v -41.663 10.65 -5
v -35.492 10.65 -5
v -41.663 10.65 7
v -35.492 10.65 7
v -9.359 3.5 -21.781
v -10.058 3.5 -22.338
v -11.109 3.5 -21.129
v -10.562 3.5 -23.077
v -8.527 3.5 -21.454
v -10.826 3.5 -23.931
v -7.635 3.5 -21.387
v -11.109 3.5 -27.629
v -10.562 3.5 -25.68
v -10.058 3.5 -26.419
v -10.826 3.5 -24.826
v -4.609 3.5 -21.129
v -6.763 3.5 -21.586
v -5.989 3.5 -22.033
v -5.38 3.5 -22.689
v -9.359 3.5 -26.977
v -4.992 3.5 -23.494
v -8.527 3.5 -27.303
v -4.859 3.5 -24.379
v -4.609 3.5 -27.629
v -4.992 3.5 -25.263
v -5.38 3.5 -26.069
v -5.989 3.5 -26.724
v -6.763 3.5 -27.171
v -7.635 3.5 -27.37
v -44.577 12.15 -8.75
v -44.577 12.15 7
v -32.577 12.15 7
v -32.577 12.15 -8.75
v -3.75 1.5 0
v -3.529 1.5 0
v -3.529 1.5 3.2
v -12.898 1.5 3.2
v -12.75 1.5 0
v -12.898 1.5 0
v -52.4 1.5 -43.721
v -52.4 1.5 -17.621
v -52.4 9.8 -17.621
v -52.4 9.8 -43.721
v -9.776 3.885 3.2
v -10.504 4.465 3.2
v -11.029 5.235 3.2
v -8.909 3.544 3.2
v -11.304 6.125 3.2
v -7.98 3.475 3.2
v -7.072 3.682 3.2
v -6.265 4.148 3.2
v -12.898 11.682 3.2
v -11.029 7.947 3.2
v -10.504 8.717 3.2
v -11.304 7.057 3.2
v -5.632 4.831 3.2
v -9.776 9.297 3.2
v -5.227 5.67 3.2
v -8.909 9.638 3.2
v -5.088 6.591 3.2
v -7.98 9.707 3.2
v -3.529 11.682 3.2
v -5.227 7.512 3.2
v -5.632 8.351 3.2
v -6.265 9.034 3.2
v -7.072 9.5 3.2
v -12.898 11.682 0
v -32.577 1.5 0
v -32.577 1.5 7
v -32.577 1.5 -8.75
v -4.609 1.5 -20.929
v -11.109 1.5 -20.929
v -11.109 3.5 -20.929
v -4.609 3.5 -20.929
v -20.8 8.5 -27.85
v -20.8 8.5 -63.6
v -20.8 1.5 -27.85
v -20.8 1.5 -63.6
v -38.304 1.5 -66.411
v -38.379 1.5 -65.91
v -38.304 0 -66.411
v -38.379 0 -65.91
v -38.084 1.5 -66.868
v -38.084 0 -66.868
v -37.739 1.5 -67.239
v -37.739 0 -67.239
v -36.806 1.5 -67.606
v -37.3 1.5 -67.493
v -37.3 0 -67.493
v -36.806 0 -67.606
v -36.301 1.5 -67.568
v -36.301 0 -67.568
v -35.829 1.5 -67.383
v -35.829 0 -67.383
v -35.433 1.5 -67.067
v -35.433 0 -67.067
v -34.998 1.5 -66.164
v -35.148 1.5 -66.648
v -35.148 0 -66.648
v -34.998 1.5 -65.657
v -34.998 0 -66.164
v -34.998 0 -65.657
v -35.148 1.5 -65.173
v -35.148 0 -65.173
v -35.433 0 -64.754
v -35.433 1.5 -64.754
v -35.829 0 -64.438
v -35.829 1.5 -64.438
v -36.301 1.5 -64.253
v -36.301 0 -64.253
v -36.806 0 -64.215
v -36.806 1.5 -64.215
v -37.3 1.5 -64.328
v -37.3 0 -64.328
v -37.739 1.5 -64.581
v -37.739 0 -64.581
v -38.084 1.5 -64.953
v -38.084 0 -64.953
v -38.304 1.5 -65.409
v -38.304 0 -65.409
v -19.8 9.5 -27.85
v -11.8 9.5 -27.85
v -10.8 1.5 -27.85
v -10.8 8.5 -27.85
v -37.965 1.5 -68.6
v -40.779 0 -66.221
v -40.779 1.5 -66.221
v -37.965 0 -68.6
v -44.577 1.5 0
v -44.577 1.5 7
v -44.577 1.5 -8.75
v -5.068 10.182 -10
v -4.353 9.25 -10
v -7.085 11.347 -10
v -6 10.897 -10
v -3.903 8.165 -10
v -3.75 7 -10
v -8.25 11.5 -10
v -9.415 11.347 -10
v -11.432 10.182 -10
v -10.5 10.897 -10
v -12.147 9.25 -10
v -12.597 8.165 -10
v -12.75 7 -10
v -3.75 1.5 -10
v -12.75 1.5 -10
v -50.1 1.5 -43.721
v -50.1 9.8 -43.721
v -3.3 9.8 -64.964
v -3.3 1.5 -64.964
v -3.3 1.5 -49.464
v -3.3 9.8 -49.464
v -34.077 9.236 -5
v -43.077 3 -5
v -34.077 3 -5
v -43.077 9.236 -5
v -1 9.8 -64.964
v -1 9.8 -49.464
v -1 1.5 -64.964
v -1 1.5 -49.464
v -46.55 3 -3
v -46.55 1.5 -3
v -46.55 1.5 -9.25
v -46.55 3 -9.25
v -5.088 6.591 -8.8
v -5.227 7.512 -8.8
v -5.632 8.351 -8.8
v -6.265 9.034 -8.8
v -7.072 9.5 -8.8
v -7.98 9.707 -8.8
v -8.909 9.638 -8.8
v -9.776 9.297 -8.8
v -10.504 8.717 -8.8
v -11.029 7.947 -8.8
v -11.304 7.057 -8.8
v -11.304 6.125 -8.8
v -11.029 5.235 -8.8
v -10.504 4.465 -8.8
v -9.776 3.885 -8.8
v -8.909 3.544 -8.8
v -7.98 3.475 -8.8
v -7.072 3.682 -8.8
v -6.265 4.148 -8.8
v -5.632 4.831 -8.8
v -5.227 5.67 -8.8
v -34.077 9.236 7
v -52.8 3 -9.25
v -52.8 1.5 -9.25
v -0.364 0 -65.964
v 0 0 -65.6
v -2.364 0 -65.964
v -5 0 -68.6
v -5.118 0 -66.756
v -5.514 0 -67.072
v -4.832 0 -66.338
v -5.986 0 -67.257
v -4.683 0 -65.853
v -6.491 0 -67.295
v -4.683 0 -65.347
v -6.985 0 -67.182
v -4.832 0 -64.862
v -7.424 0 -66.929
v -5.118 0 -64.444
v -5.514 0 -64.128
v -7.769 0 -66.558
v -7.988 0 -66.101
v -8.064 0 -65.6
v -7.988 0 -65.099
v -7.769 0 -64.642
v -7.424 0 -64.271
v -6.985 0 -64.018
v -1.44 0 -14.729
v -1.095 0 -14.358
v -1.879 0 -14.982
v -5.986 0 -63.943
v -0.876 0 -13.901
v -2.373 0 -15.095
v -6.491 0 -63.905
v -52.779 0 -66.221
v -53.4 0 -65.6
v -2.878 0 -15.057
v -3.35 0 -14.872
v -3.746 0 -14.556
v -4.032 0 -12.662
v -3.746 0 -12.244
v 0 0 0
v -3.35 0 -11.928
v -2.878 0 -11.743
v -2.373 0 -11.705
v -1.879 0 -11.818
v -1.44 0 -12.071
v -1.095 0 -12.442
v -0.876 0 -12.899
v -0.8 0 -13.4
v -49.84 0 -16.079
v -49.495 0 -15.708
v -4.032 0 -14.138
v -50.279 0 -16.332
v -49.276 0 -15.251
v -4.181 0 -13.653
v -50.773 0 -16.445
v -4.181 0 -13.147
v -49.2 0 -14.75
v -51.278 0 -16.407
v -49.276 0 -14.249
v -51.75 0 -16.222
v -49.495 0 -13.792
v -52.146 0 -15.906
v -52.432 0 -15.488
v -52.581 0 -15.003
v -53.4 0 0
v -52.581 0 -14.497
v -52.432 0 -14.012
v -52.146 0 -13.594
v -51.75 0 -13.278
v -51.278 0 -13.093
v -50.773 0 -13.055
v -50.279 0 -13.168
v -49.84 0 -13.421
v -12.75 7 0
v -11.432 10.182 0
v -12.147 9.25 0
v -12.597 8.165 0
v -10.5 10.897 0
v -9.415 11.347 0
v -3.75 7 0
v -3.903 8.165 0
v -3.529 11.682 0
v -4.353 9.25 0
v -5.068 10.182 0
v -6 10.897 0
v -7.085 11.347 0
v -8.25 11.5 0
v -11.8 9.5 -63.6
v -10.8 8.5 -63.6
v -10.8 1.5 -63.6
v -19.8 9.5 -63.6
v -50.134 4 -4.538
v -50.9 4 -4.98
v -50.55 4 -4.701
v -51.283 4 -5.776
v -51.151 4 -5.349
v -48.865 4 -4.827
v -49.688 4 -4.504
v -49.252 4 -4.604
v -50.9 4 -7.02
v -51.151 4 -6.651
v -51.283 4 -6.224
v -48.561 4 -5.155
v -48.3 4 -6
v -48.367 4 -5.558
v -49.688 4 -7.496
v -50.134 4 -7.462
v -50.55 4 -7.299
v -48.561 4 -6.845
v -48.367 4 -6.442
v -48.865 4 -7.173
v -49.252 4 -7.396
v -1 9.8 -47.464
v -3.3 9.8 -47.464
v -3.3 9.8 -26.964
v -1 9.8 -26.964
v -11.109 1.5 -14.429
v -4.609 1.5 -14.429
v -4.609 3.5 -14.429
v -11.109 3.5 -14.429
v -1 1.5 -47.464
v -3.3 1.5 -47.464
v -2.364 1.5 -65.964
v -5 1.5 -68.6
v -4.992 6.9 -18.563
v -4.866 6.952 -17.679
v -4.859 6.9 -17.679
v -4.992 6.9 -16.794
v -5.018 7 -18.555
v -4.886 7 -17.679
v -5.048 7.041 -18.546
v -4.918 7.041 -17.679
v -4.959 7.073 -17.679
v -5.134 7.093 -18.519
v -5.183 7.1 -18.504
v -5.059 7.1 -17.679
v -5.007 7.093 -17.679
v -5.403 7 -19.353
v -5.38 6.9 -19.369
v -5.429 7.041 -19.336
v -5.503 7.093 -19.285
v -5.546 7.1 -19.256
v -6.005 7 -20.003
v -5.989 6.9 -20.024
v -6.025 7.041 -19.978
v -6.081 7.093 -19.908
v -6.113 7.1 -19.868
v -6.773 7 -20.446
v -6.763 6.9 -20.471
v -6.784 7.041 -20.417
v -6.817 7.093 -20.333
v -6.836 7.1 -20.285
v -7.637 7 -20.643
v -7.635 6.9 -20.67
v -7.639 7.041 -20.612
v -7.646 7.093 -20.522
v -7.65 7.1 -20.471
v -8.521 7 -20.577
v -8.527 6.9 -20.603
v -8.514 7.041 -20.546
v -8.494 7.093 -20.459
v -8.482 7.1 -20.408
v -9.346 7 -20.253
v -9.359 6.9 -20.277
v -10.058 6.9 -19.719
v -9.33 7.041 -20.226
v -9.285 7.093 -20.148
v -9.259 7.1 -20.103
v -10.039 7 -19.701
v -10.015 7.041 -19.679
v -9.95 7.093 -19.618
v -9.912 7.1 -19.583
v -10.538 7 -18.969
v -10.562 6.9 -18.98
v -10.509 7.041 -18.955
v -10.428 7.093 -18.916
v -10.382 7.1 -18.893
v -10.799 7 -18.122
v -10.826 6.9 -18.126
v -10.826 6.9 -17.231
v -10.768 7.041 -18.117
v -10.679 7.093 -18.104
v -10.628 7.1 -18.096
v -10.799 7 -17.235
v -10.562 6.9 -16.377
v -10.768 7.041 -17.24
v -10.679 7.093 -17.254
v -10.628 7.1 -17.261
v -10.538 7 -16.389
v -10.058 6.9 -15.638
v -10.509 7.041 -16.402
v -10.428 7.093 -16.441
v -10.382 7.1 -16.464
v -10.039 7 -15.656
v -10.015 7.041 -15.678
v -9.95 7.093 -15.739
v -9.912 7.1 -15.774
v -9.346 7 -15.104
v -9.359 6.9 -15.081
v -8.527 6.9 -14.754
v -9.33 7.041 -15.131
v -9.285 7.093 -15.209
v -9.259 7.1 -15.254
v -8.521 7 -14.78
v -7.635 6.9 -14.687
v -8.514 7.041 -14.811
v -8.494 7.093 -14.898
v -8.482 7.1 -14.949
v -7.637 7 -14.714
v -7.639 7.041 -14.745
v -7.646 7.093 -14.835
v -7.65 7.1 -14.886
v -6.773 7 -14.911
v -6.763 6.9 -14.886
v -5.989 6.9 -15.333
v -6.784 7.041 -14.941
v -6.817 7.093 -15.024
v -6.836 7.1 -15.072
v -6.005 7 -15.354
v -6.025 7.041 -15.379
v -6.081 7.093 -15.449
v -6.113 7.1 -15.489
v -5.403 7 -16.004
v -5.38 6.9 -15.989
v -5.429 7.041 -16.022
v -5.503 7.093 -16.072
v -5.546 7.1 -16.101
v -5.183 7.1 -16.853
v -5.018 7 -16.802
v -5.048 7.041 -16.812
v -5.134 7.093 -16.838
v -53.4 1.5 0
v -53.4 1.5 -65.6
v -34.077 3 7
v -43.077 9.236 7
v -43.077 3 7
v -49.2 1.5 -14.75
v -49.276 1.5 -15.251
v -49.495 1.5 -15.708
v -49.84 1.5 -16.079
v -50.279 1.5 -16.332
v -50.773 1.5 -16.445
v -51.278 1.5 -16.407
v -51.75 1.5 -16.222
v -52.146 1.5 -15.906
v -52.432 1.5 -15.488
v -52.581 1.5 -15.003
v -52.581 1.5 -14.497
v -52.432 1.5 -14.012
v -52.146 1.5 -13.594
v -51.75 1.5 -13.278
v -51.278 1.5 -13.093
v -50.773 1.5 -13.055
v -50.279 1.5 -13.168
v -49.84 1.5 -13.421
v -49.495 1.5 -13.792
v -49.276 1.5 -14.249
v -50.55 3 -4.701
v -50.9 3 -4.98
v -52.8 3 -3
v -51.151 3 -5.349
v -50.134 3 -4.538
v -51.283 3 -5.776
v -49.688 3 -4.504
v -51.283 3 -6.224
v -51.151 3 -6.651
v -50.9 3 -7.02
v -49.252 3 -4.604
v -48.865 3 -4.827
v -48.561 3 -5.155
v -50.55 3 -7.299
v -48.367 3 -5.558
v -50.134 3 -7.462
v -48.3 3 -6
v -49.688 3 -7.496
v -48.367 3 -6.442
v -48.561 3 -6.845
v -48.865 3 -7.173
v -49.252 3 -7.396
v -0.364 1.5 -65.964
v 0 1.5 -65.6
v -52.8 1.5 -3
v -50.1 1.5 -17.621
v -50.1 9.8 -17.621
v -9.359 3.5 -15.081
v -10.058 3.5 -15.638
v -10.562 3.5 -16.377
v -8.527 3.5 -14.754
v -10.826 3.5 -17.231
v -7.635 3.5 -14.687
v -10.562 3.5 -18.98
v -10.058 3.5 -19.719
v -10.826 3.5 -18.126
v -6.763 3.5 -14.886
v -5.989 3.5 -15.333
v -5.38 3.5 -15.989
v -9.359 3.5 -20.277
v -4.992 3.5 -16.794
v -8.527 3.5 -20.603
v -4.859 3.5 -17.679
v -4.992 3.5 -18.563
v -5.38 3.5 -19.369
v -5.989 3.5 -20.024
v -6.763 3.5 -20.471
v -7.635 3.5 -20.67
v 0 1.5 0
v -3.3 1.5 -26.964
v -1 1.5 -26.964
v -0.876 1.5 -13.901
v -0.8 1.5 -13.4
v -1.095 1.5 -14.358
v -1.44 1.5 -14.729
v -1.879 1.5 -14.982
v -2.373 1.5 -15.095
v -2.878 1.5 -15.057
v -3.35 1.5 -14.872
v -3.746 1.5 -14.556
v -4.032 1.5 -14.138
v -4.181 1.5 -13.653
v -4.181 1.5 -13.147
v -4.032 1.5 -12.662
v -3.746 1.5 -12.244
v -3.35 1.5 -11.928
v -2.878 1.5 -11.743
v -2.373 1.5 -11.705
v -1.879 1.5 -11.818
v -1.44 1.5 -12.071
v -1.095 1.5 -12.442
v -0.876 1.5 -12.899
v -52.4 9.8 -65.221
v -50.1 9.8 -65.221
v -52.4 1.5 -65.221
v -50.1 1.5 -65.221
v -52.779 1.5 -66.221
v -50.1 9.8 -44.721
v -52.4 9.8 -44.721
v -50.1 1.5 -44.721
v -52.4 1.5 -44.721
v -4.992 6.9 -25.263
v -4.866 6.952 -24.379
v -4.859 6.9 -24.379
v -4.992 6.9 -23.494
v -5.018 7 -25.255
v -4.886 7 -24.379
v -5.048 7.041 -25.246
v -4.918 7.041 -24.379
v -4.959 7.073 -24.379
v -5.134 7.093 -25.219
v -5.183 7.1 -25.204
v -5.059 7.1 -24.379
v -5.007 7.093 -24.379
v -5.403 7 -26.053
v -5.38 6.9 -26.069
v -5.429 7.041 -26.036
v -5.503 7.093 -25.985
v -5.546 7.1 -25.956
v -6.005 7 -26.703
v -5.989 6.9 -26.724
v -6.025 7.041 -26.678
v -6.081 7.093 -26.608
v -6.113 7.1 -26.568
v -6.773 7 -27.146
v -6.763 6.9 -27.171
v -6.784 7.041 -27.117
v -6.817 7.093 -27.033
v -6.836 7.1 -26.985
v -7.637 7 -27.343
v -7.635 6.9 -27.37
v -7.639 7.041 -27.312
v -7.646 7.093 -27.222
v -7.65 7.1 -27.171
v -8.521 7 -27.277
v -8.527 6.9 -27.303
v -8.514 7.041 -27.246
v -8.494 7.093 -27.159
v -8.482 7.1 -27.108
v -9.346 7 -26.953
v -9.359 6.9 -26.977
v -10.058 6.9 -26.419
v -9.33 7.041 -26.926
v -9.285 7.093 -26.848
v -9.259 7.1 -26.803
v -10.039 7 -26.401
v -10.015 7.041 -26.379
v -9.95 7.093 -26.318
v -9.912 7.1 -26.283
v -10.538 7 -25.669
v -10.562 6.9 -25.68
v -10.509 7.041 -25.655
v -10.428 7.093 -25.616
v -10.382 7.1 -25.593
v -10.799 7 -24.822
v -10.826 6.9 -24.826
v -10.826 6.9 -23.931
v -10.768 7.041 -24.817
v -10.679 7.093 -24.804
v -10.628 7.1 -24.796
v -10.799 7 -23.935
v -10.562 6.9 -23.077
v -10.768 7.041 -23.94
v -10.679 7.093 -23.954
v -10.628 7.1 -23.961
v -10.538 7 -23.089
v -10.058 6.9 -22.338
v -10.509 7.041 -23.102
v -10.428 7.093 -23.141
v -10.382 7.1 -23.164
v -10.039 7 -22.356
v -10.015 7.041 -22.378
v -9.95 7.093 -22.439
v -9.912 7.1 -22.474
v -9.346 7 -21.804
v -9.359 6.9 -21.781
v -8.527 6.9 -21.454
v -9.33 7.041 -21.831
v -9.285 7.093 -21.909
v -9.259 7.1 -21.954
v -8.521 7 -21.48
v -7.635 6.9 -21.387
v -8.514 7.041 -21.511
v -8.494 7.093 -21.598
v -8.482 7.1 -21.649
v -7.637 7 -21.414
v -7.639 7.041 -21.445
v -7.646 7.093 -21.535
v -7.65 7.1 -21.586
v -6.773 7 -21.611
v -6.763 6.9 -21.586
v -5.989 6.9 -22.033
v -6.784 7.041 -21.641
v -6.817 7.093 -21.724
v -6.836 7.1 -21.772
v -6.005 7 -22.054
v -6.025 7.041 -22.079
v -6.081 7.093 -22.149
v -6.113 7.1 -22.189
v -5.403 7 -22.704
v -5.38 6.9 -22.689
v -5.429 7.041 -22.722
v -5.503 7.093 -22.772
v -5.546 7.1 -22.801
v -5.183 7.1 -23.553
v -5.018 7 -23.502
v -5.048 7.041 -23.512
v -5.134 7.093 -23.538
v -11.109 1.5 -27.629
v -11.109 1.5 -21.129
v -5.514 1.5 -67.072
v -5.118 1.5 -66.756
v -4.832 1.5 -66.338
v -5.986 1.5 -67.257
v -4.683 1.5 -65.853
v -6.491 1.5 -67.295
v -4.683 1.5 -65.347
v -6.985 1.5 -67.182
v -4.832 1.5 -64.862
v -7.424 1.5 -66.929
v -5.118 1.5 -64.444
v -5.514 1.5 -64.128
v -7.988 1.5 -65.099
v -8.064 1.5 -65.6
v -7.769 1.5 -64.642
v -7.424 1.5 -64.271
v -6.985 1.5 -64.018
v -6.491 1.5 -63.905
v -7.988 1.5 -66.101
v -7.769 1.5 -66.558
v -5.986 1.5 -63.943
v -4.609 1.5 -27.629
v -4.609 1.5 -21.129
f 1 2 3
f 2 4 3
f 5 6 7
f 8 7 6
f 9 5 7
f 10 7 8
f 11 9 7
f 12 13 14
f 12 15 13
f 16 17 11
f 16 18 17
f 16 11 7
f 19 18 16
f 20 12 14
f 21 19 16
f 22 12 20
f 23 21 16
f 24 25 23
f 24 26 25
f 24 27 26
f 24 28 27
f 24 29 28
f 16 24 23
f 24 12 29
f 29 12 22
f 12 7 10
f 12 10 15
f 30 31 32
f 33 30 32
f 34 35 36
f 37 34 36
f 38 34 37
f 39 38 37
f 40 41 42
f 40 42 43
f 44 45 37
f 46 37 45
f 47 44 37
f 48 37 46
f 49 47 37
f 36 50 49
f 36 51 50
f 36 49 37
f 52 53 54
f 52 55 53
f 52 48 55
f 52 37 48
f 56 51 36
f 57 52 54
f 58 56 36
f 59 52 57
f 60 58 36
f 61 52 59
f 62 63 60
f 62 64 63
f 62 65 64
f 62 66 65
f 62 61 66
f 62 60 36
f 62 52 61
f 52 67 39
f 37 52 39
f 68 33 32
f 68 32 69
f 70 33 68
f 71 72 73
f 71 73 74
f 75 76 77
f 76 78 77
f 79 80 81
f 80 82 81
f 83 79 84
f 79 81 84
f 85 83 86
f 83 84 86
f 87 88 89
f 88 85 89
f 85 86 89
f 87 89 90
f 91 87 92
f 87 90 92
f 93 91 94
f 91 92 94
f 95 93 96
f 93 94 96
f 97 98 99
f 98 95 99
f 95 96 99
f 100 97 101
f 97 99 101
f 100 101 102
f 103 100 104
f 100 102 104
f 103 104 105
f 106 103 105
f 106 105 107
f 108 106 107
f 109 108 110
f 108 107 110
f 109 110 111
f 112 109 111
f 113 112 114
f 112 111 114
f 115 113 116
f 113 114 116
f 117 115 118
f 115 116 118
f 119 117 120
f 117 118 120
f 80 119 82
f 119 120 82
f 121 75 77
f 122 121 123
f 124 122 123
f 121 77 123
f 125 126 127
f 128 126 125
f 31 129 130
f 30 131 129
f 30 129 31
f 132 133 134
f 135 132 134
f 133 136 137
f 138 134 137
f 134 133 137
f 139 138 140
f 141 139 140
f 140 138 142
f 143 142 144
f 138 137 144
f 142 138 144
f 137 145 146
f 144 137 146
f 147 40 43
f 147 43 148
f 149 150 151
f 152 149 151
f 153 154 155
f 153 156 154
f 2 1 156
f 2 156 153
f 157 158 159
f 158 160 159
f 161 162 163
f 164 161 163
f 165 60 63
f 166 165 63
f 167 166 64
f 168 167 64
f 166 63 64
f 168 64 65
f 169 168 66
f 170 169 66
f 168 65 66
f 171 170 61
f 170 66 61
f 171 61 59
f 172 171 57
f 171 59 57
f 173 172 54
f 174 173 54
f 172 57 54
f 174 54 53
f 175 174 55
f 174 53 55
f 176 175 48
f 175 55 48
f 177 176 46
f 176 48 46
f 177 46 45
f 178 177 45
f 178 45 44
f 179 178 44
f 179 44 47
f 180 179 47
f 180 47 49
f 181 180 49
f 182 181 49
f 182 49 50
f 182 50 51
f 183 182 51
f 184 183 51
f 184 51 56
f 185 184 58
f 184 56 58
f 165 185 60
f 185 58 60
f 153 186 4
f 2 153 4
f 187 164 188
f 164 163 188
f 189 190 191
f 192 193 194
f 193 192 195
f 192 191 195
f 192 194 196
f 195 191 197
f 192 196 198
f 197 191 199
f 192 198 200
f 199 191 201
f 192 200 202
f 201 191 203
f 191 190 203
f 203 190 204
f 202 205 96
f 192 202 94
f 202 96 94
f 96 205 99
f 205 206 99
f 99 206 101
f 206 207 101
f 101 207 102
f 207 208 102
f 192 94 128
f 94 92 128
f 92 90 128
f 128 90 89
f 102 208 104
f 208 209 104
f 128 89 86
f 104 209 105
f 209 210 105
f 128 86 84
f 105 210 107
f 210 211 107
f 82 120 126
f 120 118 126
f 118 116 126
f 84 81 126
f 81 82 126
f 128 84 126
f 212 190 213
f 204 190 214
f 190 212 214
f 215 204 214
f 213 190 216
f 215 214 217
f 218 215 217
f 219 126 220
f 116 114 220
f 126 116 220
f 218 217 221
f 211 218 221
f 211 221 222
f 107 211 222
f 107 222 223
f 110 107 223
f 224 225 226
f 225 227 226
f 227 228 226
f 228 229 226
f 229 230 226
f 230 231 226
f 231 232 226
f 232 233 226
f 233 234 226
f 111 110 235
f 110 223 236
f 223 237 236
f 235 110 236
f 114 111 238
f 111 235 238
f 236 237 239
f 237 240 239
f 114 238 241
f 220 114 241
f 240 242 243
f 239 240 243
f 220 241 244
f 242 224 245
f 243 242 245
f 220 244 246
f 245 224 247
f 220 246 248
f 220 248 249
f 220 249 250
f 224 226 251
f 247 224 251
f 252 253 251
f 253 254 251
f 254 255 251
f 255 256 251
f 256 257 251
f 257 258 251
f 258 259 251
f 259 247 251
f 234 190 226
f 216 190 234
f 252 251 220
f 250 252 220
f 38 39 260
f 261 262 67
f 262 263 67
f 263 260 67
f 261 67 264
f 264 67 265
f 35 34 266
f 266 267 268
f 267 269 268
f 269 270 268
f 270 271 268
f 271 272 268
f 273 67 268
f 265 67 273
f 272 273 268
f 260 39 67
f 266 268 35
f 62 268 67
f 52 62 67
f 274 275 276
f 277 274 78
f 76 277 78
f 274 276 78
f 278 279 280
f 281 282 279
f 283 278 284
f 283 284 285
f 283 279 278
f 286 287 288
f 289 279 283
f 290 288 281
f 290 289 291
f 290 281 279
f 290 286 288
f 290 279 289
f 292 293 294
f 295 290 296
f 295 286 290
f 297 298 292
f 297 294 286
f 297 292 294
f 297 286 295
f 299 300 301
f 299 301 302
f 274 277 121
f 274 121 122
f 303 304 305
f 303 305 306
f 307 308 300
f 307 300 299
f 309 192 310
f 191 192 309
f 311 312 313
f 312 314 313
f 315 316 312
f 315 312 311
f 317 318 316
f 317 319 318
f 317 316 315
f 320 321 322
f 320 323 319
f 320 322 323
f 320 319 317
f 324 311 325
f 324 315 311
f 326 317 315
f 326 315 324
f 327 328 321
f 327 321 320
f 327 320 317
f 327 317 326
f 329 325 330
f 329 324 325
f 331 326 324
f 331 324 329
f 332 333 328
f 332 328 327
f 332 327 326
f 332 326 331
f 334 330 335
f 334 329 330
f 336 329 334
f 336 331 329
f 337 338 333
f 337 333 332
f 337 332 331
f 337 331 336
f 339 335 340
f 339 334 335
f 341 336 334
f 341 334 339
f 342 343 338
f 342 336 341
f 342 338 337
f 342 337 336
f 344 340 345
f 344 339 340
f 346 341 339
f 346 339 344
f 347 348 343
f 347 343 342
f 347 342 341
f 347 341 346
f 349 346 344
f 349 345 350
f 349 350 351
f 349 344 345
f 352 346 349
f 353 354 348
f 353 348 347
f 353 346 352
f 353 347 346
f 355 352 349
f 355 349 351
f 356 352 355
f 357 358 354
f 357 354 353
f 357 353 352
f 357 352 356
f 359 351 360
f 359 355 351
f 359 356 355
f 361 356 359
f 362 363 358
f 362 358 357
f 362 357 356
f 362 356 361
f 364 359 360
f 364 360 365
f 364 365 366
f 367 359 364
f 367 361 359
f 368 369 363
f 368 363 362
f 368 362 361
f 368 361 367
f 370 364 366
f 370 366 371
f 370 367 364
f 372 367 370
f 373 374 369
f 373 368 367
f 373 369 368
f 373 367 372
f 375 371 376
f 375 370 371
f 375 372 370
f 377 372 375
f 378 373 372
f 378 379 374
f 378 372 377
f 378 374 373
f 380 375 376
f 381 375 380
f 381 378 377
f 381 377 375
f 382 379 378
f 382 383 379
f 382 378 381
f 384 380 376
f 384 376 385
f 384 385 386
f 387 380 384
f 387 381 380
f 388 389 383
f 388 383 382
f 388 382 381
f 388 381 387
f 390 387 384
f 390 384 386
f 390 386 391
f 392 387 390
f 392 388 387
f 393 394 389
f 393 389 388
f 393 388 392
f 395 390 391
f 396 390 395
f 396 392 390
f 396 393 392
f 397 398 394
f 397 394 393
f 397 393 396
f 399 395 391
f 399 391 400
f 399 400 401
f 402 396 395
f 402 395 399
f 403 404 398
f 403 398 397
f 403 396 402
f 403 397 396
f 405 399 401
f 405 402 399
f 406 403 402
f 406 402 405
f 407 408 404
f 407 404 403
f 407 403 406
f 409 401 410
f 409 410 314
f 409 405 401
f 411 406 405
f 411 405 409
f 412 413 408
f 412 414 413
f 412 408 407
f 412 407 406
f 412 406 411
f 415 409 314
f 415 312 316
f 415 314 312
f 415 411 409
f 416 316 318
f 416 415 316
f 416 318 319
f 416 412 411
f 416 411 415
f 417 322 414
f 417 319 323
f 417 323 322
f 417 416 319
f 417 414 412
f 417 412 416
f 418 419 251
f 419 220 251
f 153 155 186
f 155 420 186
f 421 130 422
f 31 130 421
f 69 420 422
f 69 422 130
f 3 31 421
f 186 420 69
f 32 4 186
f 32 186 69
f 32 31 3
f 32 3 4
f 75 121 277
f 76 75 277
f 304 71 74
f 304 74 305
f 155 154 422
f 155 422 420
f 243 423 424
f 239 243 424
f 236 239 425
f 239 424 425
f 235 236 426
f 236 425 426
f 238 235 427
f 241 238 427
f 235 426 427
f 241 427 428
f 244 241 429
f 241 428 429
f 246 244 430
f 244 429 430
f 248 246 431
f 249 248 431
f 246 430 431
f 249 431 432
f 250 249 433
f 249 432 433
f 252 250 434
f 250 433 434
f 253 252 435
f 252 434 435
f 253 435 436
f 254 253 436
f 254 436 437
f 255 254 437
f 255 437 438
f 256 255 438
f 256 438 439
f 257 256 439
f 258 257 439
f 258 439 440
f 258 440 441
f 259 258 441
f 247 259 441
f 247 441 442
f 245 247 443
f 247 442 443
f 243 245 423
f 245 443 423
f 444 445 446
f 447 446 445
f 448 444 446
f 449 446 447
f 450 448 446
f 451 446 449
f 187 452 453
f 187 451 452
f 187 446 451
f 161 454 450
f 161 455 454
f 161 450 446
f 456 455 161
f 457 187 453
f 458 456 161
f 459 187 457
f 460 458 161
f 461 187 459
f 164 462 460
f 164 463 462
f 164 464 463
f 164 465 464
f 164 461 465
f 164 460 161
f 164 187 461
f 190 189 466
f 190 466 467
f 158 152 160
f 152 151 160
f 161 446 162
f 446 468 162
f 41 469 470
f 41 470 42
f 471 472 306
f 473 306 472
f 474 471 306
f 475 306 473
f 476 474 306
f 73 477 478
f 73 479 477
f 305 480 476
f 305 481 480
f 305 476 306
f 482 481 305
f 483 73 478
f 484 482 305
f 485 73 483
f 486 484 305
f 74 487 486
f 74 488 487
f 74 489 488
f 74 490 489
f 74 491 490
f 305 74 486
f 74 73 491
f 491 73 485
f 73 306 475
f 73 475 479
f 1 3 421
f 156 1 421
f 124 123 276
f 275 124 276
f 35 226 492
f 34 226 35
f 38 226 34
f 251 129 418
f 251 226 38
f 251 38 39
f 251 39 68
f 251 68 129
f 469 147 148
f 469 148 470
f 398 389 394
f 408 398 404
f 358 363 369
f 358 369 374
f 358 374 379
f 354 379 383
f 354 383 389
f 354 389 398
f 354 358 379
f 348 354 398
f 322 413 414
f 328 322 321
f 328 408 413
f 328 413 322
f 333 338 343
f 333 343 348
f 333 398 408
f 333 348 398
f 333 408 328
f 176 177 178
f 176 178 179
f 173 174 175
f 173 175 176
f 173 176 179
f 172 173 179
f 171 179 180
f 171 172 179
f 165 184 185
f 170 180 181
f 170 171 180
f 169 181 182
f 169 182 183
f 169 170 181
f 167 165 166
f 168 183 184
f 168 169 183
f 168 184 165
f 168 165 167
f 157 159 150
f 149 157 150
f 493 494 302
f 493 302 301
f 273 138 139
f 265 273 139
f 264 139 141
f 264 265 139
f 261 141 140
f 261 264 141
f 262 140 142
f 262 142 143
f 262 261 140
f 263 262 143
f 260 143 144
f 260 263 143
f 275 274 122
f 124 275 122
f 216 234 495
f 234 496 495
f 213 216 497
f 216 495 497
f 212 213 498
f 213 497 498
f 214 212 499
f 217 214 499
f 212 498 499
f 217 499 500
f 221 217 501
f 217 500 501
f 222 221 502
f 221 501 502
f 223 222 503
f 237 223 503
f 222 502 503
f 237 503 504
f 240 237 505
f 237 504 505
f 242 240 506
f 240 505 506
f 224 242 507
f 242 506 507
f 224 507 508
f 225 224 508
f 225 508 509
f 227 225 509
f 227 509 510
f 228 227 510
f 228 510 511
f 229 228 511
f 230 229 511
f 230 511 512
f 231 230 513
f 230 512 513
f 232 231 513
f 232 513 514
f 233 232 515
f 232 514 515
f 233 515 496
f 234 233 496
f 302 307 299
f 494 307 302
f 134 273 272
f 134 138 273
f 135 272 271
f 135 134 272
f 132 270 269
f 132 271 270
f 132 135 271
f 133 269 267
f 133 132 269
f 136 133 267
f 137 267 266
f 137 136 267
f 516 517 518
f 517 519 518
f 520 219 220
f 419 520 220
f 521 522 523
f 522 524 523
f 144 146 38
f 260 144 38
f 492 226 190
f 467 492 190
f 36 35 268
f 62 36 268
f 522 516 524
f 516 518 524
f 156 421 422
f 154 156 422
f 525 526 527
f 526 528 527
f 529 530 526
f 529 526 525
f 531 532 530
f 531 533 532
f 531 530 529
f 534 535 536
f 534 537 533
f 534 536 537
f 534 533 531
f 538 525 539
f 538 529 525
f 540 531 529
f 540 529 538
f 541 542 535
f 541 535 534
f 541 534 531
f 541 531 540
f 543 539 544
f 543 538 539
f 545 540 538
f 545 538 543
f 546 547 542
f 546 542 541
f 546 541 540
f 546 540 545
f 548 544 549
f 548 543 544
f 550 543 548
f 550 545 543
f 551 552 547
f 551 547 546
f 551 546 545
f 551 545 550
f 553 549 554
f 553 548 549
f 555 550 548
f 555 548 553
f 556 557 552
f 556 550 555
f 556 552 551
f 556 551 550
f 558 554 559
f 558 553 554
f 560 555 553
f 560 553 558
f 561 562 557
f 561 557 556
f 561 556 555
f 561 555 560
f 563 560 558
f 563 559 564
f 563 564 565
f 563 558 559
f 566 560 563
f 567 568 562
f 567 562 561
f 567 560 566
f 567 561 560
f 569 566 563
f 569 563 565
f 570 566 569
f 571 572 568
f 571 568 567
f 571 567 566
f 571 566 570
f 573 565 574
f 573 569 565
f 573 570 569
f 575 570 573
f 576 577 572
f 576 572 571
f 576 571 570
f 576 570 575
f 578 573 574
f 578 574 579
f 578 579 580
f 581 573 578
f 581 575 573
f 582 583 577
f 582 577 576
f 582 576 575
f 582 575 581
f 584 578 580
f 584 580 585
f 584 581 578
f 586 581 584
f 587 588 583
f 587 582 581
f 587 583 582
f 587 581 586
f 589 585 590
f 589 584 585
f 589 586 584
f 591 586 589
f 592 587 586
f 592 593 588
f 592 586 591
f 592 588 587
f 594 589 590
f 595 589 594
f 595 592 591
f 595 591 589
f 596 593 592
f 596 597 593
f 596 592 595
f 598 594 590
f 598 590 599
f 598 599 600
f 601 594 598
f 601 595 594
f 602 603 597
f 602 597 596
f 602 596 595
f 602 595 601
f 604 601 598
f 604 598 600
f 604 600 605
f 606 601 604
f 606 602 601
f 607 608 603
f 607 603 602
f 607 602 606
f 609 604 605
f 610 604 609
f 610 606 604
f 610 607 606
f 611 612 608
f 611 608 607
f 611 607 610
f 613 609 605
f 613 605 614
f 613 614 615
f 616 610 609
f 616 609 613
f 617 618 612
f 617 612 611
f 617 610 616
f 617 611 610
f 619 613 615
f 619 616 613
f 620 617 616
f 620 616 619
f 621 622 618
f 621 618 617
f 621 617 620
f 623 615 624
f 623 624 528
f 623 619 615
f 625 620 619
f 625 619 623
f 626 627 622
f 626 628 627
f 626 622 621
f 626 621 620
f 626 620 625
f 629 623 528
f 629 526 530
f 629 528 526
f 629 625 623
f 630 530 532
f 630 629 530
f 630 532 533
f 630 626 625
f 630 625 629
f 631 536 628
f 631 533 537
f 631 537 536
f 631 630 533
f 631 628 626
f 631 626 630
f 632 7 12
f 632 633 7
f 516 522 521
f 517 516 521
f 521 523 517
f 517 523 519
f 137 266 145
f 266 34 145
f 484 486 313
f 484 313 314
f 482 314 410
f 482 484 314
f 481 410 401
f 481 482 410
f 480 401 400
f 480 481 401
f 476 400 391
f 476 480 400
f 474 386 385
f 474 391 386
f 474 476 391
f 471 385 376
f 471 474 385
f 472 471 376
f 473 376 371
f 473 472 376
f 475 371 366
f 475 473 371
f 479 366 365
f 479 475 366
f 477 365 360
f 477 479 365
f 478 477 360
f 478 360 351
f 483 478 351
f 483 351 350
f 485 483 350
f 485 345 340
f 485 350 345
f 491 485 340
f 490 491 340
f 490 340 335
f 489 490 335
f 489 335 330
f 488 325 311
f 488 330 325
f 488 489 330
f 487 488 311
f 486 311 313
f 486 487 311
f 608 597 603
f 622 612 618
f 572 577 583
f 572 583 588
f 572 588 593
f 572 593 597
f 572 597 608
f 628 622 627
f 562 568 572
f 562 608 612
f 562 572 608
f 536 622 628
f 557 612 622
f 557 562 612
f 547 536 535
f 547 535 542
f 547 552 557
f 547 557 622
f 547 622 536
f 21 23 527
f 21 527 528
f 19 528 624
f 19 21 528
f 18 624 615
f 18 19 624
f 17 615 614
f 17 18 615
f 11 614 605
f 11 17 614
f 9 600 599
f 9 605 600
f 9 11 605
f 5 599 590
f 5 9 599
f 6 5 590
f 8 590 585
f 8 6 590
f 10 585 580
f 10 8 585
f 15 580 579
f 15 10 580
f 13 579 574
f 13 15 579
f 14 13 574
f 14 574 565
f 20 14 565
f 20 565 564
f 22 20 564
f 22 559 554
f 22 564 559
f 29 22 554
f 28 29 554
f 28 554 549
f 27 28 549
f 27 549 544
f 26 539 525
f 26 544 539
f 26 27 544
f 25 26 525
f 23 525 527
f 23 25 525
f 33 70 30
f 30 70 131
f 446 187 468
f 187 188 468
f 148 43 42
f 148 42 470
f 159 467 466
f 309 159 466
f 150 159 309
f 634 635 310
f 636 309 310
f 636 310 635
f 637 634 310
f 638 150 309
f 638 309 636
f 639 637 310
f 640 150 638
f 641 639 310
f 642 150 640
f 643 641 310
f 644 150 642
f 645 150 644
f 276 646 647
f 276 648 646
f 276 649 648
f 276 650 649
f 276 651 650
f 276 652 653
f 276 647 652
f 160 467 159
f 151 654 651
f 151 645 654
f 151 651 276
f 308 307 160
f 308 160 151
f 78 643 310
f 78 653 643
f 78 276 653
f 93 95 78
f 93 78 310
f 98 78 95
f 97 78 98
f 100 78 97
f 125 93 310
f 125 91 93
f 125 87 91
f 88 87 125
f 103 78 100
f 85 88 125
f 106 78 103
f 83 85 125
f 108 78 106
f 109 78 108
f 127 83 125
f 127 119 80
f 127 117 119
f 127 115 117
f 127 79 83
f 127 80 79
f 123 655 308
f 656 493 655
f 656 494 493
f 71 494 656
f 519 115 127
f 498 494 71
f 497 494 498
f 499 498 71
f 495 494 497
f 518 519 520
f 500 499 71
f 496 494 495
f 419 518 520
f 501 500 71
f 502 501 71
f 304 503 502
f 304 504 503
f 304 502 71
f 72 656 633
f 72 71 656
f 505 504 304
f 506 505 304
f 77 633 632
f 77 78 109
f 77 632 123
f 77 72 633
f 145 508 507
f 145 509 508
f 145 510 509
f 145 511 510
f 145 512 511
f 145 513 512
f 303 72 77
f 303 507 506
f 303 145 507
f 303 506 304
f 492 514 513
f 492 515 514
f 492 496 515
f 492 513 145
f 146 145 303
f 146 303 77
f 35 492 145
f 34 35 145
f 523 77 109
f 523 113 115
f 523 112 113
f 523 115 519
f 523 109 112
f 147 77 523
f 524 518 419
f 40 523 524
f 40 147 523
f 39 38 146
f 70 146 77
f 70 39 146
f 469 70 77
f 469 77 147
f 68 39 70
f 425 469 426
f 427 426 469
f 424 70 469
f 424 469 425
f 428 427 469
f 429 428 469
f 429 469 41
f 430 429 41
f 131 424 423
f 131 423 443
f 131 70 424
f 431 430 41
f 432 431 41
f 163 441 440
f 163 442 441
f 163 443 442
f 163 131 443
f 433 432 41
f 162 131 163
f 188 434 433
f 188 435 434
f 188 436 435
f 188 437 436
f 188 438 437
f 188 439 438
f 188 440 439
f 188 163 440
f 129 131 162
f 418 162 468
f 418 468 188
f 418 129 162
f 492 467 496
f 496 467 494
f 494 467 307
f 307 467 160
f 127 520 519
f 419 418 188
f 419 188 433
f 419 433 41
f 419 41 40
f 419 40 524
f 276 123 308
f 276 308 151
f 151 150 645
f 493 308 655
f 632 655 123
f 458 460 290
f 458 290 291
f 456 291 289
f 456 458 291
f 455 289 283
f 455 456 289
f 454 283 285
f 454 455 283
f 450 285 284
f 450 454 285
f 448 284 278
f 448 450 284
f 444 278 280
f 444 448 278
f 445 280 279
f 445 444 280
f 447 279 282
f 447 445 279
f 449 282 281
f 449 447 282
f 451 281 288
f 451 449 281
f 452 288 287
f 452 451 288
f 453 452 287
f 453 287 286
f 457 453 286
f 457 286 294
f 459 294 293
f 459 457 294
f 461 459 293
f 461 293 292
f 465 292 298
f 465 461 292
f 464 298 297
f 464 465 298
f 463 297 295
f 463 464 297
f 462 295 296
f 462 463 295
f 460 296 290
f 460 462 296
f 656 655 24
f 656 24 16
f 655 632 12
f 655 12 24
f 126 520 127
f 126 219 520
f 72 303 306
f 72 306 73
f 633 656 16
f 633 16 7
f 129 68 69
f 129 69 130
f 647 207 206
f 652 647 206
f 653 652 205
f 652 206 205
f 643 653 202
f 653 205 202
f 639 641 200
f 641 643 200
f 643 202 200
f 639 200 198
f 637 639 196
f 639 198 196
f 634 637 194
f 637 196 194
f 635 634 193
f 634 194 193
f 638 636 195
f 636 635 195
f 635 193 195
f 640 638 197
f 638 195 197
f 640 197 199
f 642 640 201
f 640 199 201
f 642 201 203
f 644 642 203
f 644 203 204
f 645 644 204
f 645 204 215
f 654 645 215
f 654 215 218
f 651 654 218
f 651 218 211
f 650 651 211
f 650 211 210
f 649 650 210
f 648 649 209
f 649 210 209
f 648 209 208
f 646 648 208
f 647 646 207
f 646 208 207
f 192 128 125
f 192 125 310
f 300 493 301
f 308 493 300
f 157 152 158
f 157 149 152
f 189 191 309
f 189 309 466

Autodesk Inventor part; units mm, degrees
ref_plane "YZ Plane" through (0, 0, 0) normal (1, 0, 0) x (0, 1, 0)
ref_plane "XZ Plane" through (0, 0, 0) normal (0, 1, 0) x (-1, 0, 0)
ref_plane "XY Plane" through (0, 0, 0) normal (0, 0, 1) x (1, 0, 0)
sketch "Sketch1" plane through (0, 0, 0) normal (0, 1, 0) x (-1, 0, 0)
  line L0 (0, 0) -> (53.4, 0)
  line L1 (5, -68.6) -> (2.3639, -65.9639)
  line L2 (5, -68.6) -> (8.728, -68.6) construction
  line L3 (2.3639, -65.9639) -> (0.3639, -65.9639)
  line L4 (0.3639, -65.9639) -> (0, -65.6)
  line L5 (52.7794, -66.2206) -> (53.4, -65.6)
  line L6 (52.7794, -66.2206) -> (40.7794, -66.2206)
  line L7 (40.7794, -66.2206) -> (37.9652, -68.6)
  line L8 (37.9652, -68.6) -> (5, -68.6)
  line L9 (53.4, -65.6) -> (53.4, 0)
  line L10 (0, 0) -> (0, -65.6)
  circle A0 centre (36.6794, -65.9103) radius 1.7
  circle A1 centre (6.3639, -65.6) radius 1.7
  dimension "d2" = 135
  dimension "d3" = 135
  dimension "d10" = 12
  dimension "d12" = 135
  dimension "d13" = 3.4
  dimension "d14" = 3.4
  dimension "d15" = 4.1
  dimension "d16" = 4
extrude "Extrusion1" add sketch "Sketch1" along normal blind 1.5
sketch "Sketch2" plane through (0, 1.5, 0) normal (0, 1, 0) x (1, 0, 0)
  circle A0 centre (-50.9, 14.75) radius 1.7
  line L0 (-53.4, 0) -> (0, 0) projected
  line L1 (-53.4, 65.6) -> (-53.4, 0) projected
  circle A1 centre (-2.5, 13.4) radius 1.7
  line L2 (0, 0) -> (0, 65.6) projected
  dimension "d19" = 3.4
  dimension "d20" = 14.75
  dimension "d21" = 2.5
  dimension "d22" = 3.4
  dimension "d23" = 13.4
  dimension "d24" = 2.5
extrude "Extrusion2" cut sketch "Sketch2" against normal blind 1.5
sketch "Sketch3" plane through (0, 1.5, 0) normal (0, 1, 0) x (1, 0, 0)
  line L0 (-1, 64.9639) -> (-3.3, 64.9639)
  line L1 (-3.3, 64.9639) -> (-3.3, 49.4639)
  line L2 (-3.3, 49.4639) -> (-1, 49.4639)
  line L3 (-1, 49.4639) -> (-1, 64.9639)
  line L4 (-0.3639, 65.9639) -> (-2.3639, 65.9639) projected
  line L5 (0, 0) -> (0, 65.6) projected
  line L6 (-3.3, 47.4639) -> (-1, 47.4639)
  line L7 (-1, 47.4639) -> (-1, 26.9639)
  line L8 (-1, 26.9639) -> (-3.3, 26.9639)
  line L9 (-3.3, 26.9639) -> (-3.3, 47.4639)
  line L10 (-52.4, 44.7206) -> (-50.1, 44.7206)
  line L11 (-50.1, 44.7206) -> (-50.1, 65.2206)
  line L12 (-50.1, 65.2206) -> (-52.4, 65.2206)
  line L13 (-52.4, 65.2206) -> (-52.4, 44.7206)
  line L14 (-53.4, 65.6) -> (-53.4, 0) projected
  line L15 (-40.7794, 66.2206) -> (-52.7794, 66.2206) projected
  line L16 (-52.4, 43.7206) -> (-50.1, 43.7206)
  line L17 (-50.1, 43.7206) -> (-50.1, 17.6206)
  line L18 (-50.1, 17.6206) -> (-52.4, 17.6206)
  line L19 (-52.4, 17.6206) -> (-52.4, 43.7206)
  dimension "d27" = 1
  dimension "d28" = 15.5
  dimension "d29" = 2.3
  dimension "d30" = 1
  dimension "d31" = 2
  dimension "d32" = 2.3
  dimension "d33" = 20.5
  dimension "d34" = 1
  dimension "d35" = 1
  dimension "d36" = 2.3
  dimension "d37" = 20.5
  dimension "d38" = 26.1
  dimension "d39" = 1
extrude "Extrusion3" add sketch "Sketch3" along normal blind 8.3
sketch "Sketch4" plane through (0, 1.5, 0) normal (0, 1, 0) x (1, 0, 0)
  line L0 (-20.8, 27.85) -> (-10.8, 27.85)
  line L1 (-10.8, 27.85) -> (-10.8, 63.6)
  line L2 (-10.8, 63.6) -> (-20.8, 63.6)
  line L3 (-20.8, 63.6) -> (-20.8, 27.85)
  line L4 (-3.3, 47.4639) -> (-3.3, 26.9639) projected
  line L5 (-5, 68.6) -> (-37.9652, 68.6) projected
  point P0 (0, 0)
  dimension "d42" = 10
  dimension "d43" = 35.75
  dimension "d44" = 7.5
  dimension "d45" = 5
extrude "Extrusion4" add sketch "Sketch4" along normal blind 8
chamfer "Chamfer1" distance 1 angle 45 2 edges at (-20.8, 9.5, -45.725) (-10.8, 9.5, -45.725)
sketch "Sketch5" plane through (0, 1.5, 0) normal (0, 1, 0) x (1, 0, 0)
  line L0 (-4.6091, 14.4286) -> (-11.1091, 14.4286)
  line L1 (-11.1091, 14.4286) -> (-11.1091, 20.9286)
  line L2 (-11.1091, 20.9286) -> (-4.6091, 20.9286)
  line L3 (-4.6091, 20.9286) -> (-4.6091, 14.4286)
  line L4 (-4.6091, 21.1286) -> (-11.1091, 21.1286)
  line L5 (-11.1091, 21.1286) -> (-11.1091, 27.6286)
  line L6 (-11.1091, 27.6286) -> (-4.6091, 27.6286)
  line L7 (-4.6091, 27.6286) -> (-4.6091, 21.1286)
  point P0 (0, 0)
  dimension "d51" = 6.5
  dimension "d52" = 6.5
  dimension "d53" = 6.5
  dimension "d54" = 0.2
extrude "Extrusion5" add sketch "Sketch5" along normal blind 2
sketch "Sketch6" plane through (0, 3.5, 0) normal (0, 1, 0) x (1, 0, 0)
  circle A0 centre (-7.8591, 17.6786) radius 3
  line L0 (-4.6091, 20.9286) -> (-11.1091, 20.9286) projected
  line L1 (-4.6091, 14.4286) -> (-4.6091, 20.9286) projected
  point P0 (0, 0)
  dimension "d57" = 6
  dimension "d58" = 3.25
  dimension "d59" = 3.25
extrude "Extrusion6" add sketch "Sketch6" along normal blind 3.6
sketch "Sketch7" plane through (0, 3.5, 0) normal (0, 1, 0) x (1, 0, 0)
  circle A0 centre (-7.8591, 24.3786) radius 3
  line L0 (-11.1091, 21.1286) -> (-4.6091, 21.1286) projected
  line L1 (-11.1091, 27.6286) -> (-11.1091, 21.1286) projected
  point P0 (0, 0)
  dimension "d62" = 6
  dimension "d63" = 3.25
  dimension "d64" = 3.25
extrude "Extrusion7" add sketch "Sketch7" along normal blind 3.6
fillet "Fillet1" radius 0.2 2 edges at (-10.8591, 7.1, -17.6786) (-10.8591, 7.1, -24.3786)
sketch "Sketch8" plane through (0, 1.5, 0) normal (0, 1, 0) x (1, 0, 0)
  line L0 (-52.8, 3) -> (-46.55, 3)
  line L1 (-46.55, 3) -> (-46.55, 9.25)
  line L2 (-46.55, 9.25) -> (-52.8, 9.25)
  line L3 (-52.8, 9.25) -> (-52.8, 3)
  line L4 (-53.4, 65.6) -> (-53.4, 0) projected
  line L5 (-53.4, 0) -> (0, 0) projected
  dimension "d68" = 6.25
  dimension "d69" = 6.25
  dimension "d70" = 0.6
  dimension "d71" = 3
extrude "Extrusion8" add sketch "Sketch8" along normal blind 1.5
sketch "Sketch9" plane through (0, 3, 0) normal (0, 1, 0) x (1, 0, 0)
  circle A0 centre (-49.8, 6) radius 1.5
  line L0 (-46.55, 9.25) -> (-52.8, 9.25) projected
  line L1 (-46.55, 3) -> (-46.55, 9.25) projected
  point P0 (0, 0)
  dimension "d74" = 3
  dimension "d75" = 3.25
  dimension "d76" = 3.25
extrude "Extrusion9" add sketch "Sketch9" along normal blind 1
sketch "Sketch10" plane through (0, 1.5, 0) normal (0, 1, 0) x (1, 0, 0)
  line L0 (-12.75, 0) -> (-3.75, 0)
  line L1 (-3.75, 0) -> (-3.75, 10)
  line L2 (-3.75, 10) -> (-12.75, 10)
  line L3 (-12.75, 10) -> (-12.75, 0)
  line L4 (0, 0) -> (0, 65.6) projected
  dimension "d79" = 9
  dimension "d80" = 10
  dimension "d81" = 3.75
extrude "Extrusion10" add sketch "Sketch10" along normal blind 10
sketch "Sketch11" plane through (-53.4, 0, 0) normal (0, 0, 1) x (1, 0, 0)
  line L0 (42.6, 1.5) -> (32.6, 1.5) projected
  line L1 (40.5024, 1.5) -> (49.871, 1.5)
  line L2 (49.871, 1.5) -> (49.871, 11.6818)
  line L3 (49.871, 11.6818) -> (40.5024, 11.6818)
  line L4 (40.5024, 11.6818) -> (40.5024, 1.5)
  point P0 (53.4, 0)
extrude "Extrusion11" add sketch "Sketch11" along normal blind 3.2
fillet "Fillet2" radius 4.5 2 edges at (-3.75, 11.5, -5) (-12.75, 11.5, -5)
sketch "Sketch12" plane through (-53.4, 0, 3.2) normal (0, 0, 1) x (1, 0, 0)
  circle A0 centre (45.1865, 6.591) radius 3.125
  line L0 (40.5024, 1.5) -> (49.871, 1.5) projected
  line L1 (49.871, 1.5) -> (49.871, 11.6818) projected
  point P0 (53.4, 0)
  dimension "d87" = 6.25
  dimension "d88" = 5.091
  dimension "d89" = 4.6845
extrude "Extrusion12" cut sketch "Sketch12" against normal blind 12
sketch "Sketch13" plane through (0, 1.5, 0) normal (0, 1, 0) x (1, 0, 0)
  line L0 (-44.5774, 0) -> (-32.5774, 0)
  line L1 (-32.5774, 0) -> (-32.5774, 8.75)
  line L2 (-32.5774, 8.75) -> (-44.5774, 8.75)
  line L3 (-44.5774, 8.75) -> (-44.5774, 0)
  point P0 (0, 0)
  dimension "d92" = 12
  dimension "d93" = 8.75
extrude "Extrusion13" add sketch "Sketch13" along normal blind 10.65
sketch "Sketch14" plane through (-53.4, 0, 0) normal (0, 0, 1) x (1, 0, 0)
  line L0 (8.8226, 1.5) -> (8.8226, 12.15) projected
  line L1 (48.4, 1.5) -> (15.4348, 1.5) projected
  line L2 (8.8226, 12.15) -> (20.8226, 12.15)
  line L3 (20.8226, 12.15) -> (20.8226, 1.5)
  line L4 (20.8226, 1.5) -> (8.8226, 1.5)
  line L5 (8.8226, 1.5) -> (8.8226, 12.15)
  point P0 (53.4, 0)
extrude "Extrusion14" add sketch "Sketch14" along normal blind 7
sketch "Sketch15" plane through (-53.4, 0, 7) normal (0, 0, 1) x (1, 0, 0)
  line L0 (19.3226, 3) -> (19.3226, 9.2358)
  line L1 (19.3226, 9.2358) -> (17.9084, 10.65)
  line L2 (17.9084, 10.65) -> (11.7368, 10.65)
  line L3 (11.7368, 10.65) -> (10.3226, 9.2358)
  line L4 (10.3226, 9.2358) -> (10.3226, 3)
  line L5 (10.3226, 3) -> (19.3226, 3)
  line L6 (20.8226, 1.5) -> (20.8226, 12.15) projected
  line L7 (8.8226, 12.15) -> (8.8226, 1.5) projected
  line L8 (20.8226, 12.15) -> (8.8226, 12.15) projected
  line L9 (8.8226, 1.5) -> (20.8226, 1.5) projected
  point P0 (53.4, 0)
  dimension "d98" = 2
  dimension "d99" = 135
  dimension "d100" = 2
  dimension "d101" = 135
  dimension "d102" = 1.5
  dimension "d103" = 1.5
  dimension "d104" = 1.5
  dimension "d105" = 1.5
extrude "Extrusion15" cut sketch "Sketch15" against normal blind 12 contours L5 L4 L3 L2 L1 L0
properties part number "arduinoUno"
